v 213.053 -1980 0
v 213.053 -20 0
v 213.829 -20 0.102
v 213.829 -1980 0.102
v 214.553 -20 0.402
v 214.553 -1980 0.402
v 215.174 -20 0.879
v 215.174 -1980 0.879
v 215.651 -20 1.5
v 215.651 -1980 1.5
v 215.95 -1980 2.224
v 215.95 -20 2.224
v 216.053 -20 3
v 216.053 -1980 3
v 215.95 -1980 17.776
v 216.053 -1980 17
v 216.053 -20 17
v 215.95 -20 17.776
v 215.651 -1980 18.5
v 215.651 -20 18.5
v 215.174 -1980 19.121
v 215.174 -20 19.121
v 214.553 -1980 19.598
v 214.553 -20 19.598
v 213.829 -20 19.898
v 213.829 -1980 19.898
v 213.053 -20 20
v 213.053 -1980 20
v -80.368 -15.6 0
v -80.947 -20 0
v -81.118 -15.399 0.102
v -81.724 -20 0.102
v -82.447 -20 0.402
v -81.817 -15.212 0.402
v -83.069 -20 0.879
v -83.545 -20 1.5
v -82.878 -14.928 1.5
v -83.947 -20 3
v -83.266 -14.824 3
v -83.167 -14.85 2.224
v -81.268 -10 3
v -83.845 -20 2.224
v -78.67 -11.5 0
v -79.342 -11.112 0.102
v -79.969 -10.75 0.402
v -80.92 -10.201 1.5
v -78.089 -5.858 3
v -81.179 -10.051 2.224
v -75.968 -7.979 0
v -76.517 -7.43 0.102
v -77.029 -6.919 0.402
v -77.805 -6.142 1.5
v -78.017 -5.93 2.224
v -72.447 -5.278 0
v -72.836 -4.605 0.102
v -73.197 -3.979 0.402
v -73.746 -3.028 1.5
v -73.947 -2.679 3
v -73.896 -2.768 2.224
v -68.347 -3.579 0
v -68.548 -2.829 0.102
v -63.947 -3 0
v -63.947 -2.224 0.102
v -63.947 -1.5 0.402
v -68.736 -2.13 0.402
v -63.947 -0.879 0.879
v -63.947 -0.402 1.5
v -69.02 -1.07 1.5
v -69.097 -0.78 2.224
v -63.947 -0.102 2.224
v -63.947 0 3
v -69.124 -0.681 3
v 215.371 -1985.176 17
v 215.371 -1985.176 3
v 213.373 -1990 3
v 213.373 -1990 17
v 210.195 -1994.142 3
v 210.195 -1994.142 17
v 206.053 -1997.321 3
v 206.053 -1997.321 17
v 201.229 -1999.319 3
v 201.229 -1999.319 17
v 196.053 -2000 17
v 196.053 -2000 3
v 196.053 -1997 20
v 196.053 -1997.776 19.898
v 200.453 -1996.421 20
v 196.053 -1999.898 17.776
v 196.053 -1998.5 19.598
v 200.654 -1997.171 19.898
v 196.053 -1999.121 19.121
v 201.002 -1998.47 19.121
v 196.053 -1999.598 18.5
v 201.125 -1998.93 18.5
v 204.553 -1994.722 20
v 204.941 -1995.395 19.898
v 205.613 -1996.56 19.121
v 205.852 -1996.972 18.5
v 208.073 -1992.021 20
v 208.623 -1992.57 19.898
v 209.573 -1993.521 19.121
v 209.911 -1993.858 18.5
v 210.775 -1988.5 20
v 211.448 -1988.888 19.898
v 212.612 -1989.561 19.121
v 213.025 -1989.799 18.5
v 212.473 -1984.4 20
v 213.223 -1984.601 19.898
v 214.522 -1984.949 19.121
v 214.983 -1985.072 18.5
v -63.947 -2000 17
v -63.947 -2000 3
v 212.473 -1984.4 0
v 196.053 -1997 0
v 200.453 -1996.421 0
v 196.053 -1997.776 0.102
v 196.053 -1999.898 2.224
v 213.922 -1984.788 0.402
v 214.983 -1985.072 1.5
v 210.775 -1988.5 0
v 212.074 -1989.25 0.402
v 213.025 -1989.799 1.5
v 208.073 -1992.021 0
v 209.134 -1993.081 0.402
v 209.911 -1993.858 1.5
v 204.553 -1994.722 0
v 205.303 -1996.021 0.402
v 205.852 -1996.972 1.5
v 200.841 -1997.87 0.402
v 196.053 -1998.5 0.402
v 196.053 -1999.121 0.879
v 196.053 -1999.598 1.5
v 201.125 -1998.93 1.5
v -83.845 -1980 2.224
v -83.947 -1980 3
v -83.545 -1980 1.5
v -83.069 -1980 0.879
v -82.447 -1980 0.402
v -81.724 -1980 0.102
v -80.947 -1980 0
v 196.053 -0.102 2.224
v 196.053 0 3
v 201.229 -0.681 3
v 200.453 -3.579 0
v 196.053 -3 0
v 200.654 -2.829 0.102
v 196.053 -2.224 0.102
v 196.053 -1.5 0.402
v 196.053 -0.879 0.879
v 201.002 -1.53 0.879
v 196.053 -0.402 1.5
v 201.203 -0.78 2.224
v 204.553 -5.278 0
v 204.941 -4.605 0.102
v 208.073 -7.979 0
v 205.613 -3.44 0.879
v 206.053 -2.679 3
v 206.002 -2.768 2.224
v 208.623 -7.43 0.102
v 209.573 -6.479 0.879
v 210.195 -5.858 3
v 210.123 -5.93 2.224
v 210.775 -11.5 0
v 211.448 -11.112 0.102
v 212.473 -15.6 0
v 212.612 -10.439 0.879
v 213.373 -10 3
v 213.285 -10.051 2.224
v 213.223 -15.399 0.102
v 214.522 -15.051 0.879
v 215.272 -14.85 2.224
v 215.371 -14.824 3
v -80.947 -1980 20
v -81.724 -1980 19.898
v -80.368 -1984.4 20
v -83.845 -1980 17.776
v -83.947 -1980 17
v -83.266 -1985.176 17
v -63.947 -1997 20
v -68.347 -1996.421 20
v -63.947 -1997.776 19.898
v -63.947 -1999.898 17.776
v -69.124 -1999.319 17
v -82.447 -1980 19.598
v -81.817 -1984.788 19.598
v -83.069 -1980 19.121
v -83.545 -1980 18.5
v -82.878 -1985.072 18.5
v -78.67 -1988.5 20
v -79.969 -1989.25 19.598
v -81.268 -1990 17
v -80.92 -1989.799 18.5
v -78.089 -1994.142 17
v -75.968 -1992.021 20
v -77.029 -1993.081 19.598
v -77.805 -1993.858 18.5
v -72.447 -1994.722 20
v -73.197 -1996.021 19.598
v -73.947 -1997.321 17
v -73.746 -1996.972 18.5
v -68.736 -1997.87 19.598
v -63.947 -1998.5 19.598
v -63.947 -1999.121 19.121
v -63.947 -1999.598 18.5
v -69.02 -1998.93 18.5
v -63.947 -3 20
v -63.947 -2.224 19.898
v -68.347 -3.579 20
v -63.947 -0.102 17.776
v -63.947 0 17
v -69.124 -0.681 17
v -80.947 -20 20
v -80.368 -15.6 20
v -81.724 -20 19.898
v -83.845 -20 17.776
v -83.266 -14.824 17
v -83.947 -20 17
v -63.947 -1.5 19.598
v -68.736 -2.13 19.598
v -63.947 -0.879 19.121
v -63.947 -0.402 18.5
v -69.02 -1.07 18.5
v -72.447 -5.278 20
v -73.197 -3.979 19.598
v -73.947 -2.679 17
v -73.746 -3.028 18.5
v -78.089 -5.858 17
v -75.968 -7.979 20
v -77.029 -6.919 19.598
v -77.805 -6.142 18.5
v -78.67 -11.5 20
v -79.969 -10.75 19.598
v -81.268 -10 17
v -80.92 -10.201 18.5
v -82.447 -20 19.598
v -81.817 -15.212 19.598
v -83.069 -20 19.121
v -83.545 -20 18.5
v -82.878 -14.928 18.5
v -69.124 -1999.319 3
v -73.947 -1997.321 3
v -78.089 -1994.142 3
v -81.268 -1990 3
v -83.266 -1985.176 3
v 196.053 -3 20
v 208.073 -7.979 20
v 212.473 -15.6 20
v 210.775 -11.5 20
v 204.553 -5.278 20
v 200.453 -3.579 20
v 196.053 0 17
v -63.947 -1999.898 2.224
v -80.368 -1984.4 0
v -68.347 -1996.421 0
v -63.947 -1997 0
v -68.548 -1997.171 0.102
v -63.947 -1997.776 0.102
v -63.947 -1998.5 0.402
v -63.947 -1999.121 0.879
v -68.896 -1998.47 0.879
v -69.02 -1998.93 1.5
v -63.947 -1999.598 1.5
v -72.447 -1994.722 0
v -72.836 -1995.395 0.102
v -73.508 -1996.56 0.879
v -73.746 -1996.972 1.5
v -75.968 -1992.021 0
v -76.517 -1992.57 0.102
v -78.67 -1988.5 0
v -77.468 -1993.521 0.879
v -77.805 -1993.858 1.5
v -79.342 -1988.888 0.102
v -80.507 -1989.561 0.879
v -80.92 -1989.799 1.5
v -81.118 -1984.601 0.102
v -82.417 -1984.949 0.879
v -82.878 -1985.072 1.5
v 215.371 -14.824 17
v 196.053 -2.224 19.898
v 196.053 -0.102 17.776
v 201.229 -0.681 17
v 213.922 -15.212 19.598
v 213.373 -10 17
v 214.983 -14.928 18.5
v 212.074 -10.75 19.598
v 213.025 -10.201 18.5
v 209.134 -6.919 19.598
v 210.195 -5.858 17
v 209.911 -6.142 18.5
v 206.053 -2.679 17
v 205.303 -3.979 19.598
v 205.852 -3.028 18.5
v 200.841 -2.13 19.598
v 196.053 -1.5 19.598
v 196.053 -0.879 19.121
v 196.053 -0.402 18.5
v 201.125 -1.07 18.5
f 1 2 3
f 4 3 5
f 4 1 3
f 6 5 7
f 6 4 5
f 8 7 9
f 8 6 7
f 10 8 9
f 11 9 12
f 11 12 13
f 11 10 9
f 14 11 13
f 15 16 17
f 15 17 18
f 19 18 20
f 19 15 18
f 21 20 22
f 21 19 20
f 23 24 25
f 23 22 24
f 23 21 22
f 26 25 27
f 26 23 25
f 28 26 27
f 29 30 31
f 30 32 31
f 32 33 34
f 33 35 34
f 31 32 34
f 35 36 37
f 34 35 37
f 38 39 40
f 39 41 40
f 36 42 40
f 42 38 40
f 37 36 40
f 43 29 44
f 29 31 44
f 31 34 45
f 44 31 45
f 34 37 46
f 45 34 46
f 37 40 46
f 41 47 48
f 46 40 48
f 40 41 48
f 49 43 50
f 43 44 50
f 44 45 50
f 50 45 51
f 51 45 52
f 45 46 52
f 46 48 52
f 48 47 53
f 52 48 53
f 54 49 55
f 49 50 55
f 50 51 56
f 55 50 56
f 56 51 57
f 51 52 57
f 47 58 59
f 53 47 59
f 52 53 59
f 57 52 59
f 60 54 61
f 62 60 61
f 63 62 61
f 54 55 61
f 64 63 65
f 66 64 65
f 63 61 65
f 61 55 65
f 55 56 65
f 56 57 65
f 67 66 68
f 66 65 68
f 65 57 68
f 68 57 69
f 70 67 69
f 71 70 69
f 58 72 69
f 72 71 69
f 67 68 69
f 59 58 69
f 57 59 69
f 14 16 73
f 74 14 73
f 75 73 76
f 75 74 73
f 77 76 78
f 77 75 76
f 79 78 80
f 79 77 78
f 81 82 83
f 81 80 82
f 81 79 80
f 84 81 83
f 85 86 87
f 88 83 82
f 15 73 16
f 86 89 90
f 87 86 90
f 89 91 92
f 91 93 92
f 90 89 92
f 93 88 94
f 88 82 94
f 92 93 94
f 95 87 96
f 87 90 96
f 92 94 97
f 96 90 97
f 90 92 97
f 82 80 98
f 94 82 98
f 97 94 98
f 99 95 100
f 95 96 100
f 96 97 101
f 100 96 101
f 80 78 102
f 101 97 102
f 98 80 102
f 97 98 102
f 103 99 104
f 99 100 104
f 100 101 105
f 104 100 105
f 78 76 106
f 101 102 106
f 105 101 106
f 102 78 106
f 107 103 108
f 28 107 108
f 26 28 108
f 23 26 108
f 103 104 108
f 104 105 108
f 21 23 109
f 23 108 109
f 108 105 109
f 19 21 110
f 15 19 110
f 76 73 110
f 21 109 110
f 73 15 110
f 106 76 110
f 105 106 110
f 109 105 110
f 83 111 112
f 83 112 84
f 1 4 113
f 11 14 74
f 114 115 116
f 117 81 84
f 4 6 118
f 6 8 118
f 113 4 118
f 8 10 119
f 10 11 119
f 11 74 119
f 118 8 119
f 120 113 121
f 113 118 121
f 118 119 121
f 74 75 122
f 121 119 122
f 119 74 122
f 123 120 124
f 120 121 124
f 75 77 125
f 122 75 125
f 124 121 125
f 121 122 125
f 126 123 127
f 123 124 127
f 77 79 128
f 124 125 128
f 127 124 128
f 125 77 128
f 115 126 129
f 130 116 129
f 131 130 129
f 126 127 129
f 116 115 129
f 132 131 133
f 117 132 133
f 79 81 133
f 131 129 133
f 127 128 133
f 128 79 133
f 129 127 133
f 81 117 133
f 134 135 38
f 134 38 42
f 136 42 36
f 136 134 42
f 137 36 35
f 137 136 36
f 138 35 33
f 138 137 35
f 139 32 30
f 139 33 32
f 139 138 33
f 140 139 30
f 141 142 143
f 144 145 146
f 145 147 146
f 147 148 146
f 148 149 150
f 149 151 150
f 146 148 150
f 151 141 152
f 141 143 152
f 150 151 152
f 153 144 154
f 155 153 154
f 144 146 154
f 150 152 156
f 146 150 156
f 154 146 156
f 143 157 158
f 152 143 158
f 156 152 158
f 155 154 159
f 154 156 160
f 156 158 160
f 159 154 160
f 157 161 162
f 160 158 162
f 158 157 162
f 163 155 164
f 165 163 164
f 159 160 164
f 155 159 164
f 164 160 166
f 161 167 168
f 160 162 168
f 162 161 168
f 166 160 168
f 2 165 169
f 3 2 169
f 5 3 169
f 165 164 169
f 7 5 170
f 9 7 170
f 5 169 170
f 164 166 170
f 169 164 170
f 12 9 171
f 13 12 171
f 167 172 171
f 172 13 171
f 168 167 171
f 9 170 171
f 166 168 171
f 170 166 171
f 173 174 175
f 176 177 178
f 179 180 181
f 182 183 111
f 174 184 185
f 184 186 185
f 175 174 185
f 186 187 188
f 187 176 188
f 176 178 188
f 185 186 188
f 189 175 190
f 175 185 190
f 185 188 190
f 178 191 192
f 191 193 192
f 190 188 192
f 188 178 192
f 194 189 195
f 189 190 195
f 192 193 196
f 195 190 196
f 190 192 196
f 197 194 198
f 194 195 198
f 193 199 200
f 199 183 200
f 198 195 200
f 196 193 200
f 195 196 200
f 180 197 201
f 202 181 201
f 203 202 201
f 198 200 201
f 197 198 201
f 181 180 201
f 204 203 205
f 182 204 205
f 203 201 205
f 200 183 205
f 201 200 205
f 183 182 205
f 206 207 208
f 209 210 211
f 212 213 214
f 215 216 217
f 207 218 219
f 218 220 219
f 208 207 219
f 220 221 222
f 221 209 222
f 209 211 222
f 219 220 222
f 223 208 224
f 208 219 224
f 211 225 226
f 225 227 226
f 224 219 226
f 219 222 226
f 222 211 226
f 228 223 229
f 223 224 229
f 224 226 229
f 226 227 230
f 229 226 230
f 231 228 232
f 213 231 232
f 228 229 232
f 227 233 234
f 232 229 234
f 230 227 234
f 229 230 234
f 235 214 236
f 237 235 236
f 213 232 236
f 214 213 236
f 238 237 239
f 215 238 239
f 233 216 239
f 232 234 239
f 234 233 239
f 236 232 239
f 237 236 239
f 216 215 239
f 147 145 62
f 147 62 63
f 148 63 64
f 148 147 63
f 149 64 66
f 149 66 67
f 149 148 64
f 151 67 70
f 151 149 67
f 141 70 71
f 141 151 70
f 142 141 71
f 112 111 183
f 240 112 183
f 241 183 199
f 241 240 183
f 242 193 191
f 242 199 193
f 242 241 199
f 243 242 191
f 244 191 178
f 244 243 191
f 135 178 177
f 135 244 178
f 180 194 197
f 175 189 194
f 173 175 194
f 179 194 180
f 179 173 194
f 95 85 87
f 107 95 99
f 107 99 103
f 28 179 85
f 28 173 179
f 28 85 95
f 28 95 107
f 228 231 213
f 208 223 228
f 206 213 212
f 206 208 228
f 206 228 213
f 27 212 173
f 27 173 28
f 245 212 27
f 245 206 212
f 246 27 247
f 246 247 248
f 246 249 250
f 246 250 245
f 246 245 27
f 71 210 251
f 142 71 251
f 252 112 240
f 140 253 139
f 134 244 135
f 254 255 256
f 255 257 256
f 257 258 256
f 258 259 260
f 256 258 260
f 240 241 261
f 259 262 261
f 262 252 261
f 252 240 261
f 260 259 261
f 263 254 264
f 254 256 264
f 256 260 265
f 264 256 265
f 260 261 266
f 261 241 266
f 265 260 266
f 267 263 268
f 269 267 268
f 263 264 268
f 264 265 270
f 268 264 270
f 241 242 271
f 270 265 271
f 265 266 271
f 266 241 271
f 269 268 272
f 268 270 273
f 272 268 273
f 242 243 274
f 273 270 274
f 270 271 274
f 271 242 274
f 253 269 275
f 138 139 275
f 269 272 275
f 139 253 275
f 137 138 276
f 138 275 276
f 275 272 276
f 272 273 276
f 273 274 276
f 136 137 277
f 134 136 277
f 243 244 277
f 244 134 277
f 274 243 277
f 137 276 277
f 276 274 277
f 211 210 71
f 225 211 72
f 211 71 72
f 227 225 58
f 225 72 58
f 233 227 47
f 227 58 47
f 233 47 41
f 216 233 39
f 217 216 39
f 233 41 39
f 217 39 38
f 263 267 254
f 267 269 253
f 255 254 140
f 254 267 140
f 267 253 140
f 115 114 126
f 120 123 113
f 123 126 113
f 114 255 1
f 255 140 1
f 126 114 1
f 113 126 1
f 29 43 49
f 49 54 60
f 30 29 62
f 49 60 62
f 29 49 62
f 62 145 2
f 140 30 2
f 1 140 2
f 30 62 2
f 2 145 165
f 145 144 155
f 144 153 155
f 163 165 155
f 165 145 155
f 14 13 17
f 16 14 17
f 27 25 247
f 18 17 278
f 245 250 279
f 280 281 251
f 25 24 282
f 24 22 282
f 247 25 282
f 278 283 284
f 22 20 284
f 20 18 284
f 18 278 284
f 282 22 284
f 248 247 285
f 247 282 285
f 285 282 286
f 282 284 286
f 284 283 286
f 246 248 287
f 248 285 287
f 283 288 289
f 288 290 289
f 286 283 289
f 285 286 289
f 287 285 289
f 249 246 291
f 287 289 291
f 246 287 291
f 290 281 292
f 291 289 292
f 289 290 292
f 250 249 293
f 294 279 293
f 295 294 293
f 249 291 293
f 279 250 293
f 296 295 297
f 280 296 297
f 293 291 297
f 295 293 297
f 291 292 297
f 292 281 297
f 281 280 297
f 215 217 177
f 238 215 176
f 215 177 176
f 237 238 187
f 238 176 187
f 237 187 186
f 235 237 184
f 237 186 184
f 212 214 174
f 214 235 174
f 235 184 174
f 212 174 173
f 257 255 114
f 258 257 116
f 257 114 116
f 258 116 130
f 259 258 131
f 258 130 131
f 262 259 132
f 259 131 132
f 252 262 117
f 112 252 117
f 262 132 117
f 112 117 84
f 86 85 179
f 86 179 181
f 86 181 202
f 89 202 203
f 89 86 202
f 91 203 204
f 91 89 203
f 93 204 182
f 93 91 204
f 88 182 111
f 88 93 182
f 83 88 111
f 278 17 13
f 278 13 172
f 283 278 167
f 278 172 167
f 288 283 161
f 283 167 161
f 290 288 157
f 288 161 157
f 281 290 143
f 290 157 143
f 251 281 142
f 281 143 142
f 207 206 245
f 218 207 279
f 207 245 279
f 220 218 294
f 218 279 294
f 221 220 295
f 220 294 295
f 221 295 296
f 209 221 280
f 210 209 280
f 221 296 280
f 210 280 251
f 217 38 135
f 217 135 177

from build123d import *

# Parameters (mm, degrees)
F0_W         = 300
F0_H         = 20
F1_DEPTH     = 2000
F2_R         = 3
F3_T1_DEPTH  = 20
F3_T4_ANGLE  = 90
F3_T6_ANGLE  = 90
F3_T8_ANGLE  = 90
F3_T10_ANGLE = 90
F3_T12_ANGLE = 90
F3_T14_ANGLE = 90
F3_T16_ANGLE = 90
F3_T18_ANGLE = 90


# Not quite as in the source:
# - a fillet or chamfer that OpenCascade refuses, or shapes differently, is made with other operations: its cross-section is extruded or revolved along the edge and cut away or added


with BuildPart() as f1:
    # F0 (on Front) → F1 (new body)
    with BuildSketch(Plane.XZ):
        with Locations((66.0526476468, 10)):
            Rectangle(F0_W, F0_H)
    extrude(amount=F1_DEPTH)

    # F2
    f2_edges = [f1.edges().sort_by_distance(p)[0] for p in [
        (216.052648, -1000, 20),
        (-83.947352, -1000, 20),
        (66.052648, 0, 20),
        (66.052648, -2000, 20),
        (-83.947352, -1000, 0),
        (216.052648, -1000, 0),
        (66.052648, 0, 0),
        (66.052648, -2000, 0),
    ]]
    fillet(f2_edges, radius=F2_R)

    # F3: fillet of radius 20 on 4 edges, made by hand

    # F3_s2 → F3_t1 (cut)
    with BuildSketch(Plane.XY):
        with BuildLine():
            ThreePointArc((216.0526476468, -20), (210.1947832705, -5.8578643763), (196.0526476468, 0))
            Line((196.0526476468, 0), (216.0526476468, 0))
            Line((216.0526476468, 0), (216.0526476468, -20))
        make_face()
        with BuildLine():
            ThreePointArc((-63.9473523532, 0), (-78.0894879769, -5.8578643763), (-83.9473523532, -20))
            Line((-83.9473523532, -20), (-83.9473523532, 0))
            Line((-83.9473523532, 0), (-63.9473523532, 0))
        make_face()
        with BuildLine():
            ThreePointArc((216.0526476468, -1980), (210.1947832705, -1994.1421356237), (196.0526476468, -2000))
            Line((196.0526476468, -2000), (216.0526476468, -2000))
            Line((216.0526476468, -2000), (216.0526476468, -1980))
        make_face()
        with BuildLine():
            ThreePointArc((-63.9473523532, -2000), (-78.0894879769, -1994.1421356237), (-83.9473523532, -1980))
            Line((-83.9473523532, -1980), (-83.9473523532, -2000))
            Line((-83.9473523532, -2000), (-63.9473523532, -2000))
        make_face()
    extrude(amount=F3_T1_DEPTH, mode=Mode.SUBTRACT)

    # F3_s3 → F3_t4 (revolve, cut)
    with BuildSketch(Plane.XZ.offset(1980)):
        with BuildLine():
            ThreePointArc((-80.9473523532, 20), (-83.0686726968, 19.1213203436), (-83.9473523532, 17))
            Line((-83.9473523532, 17), (-83.9473523532, 20))
            Line((-83.9473523532, 20), (-80.9473523532, 20))
        make_face()
    revolve(axis=Axis((-63.9473523532, -1980, 20), (0, 0, 1)), revolution_arc=F3_T4_ANGLE, mode=Mode.SUBTRACT)

    # F3_s5 → F3_t6 (revolve, cut)
    with BuildSketch(Plane.YZ.offset(-63.9473523532)):
        with BuildLine():
            ThreePointArc((-1997, 0), (-1999.1213203436, 0.8786796564), (-2000, 3))
            Line((-2000, 3), (-2000, 0))
            Line((-2000, 0), (-1997, 0))
        make_face()
    revolve(axis=Axis((-63.9473523532, -1980, 0), (0, 0, -1)), revolution_arc=F3_T6_ANGLE, mode=Mode.SUBTRACT)

    # F3_s7 → F3_t8 (revolve, cut)
    with BuildSketch(Plane.XZ.offset(1980)):
        with BuildLine():
            ThreePointArc((213.0526476468, 0), (215.1739679904, 0.8786796564), (216.0526476468, 3))
            Line((216.0526476468, 3), (216.0526476468, 0))
            Line((216.0526476468, 0), (213.0526476468, 0))
        make_face()
    revolve(axis=Axis((196.0526476468, -1980, 0), (0, 0, -1)), revolution_arc=F3_T8_ANGLE, mode=Mode.SUBTRACT)

    # F3_s9 → F3_t10 (revolve, cut)
    with BuildSketch(Plane.YZ.offset(196.0526476468)):
        with BuildLine():
            ThreePointArc((-1997, 20), (-1999.1213203436, 19.1213203436), (-2000, 17))
            Line((-2000, 17), (-2000, 20))
            Line((-2000, 20), (-1997, 20))
        make_face()
    revolve(axis=Axis((196.0526476468, -1980, 20), (0, 0, 1)), revolution_arc=F3_T10_ANGLE, mode=Mode.SUBTRACT)

    # F3_s11 → F3_t12 (revolve, cut)
    with BuildSketch(Plane.YZ.offset(-63.9473523532)):
        with BuildLine():
            ThreePointArc((-3, 20), (-0.8786796564, 19.1213203436), (0, 17))
            Line((0, 17), (0, 20))
            Line((0, 20), (-3, 20))
        make_face()
    revolve(axis=Axis((-63.9473523532, -20, 20), (0, 0, 1)), revolution_arc=F3_T12_ANGLE, mode=Mode.SUBTRACT)

    # F3_s13 → F3_t14 (revolve, cut)
    with BuildSketch(Plane.XZ.offset(20)):
        with BuildLine():
            ThreePointArc((-80.9473523532, 0), (-83.0686726968, 0.8786796564), (-83.9473523532, 3))
            Line((-83.9473523532, 3), (-83.9473523532, 0))
            Line((-83.9473523532, 0), (-80.9473523532, 0))
        make_face()
    revolve(axis=Axis((-63.9473523532, -20, 0), (0, 0, -1)), revolution_arc=F3_T14_ANGLE, mode=Mode.SUBTRACT)

    # F3_s15 → F3_t16 (revolve, cut)
    with BuildSketch(Plane.YZ.offset(196.0526476468)):
        with BuildLine():
            ThreePointArc((-3, 0), (-0.8786796564, 0.8786796564), (0, 3))
            Line((0, 3), (0, 0))
            Line((0, 0), (-3, 0))
        make_face()
    revolve(axis=Axis((196.0526476468, -20, 0), (0, 0, -1)), revolution_arc=F3_T16_ANGLE, mode=Mode.SUBTRACT)

    # F3_s17 → F3_t18 (revolve, cut)
    with BuildSketch(Plane.XZ.offset(20)):
        with BuildLine():
            ThreePointArc((213.0526476468, 20), (215.1739679904, 19.1213203436), (216.0526476468, 17))
            Line((216.0526476468, 17), (216.0526476468, 20))
            Line((216.0526476468, 20), (213.0526476468, 20))
        make_face()
    revolve(axis=Axis((196.0526476468, -20, 20), (0, 0, 1)), revolution_arc=F3_T18_ANGLE, mode=Mode.SUBTRACT)


solid = f1.part
